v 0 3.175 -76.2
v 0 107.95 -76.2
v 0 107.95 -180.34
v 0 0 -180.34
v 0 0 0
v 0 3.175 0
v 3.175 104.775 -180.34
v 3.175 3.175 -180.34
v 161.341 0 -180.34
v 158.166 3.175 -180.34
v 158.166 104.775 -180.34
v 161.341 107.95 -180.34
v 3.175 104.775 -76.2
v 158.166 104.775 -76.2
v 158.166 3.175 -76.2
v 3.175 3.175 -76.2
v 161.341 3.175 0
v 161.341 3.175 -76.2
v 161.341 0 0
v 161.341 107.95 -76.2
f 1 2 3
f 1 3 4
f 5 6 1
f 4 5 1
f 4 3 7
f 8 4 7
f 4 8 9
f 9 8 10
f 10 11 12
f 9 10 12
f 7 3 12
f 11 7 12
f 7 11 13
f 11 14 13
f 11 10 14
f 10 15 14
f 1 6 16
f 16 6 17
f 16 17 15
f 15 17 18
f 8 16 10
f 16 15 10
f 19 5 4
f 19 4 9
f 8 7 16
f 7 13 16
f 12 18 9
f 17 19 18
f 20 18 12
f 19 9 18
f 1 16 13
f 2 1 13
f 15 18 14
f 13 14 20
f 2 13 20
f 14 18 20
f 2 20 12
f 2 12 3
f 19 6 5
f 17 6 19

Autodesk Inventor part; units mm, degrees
ref_plane "YZ Plane" through (0, 0, 0) normal (1, 0, 0) x (0, 1, 0)
ref_plane "XZ Plane" through (0, 0, 0) normal (0, 1, 0) x (-1, 0, 0)
ref_plane "XY Plane" through (0, 0, 0) normal (0, 0, 1) x (1, 0, 0)
sketch "Sketch1" plane through (0, 0, 0) normal (0, 0, 1) x (1, 0, 0)
  line L0 (0, 0) -> (161.3408, 0)
  line L1 (161.3408, 0) -> (161.3408, 107.95)
  line L2 (161.3408, 107.95) -> (0, 107.95)
  line L3 (0, 107.95) -> (0, 0)
  line L4 (3.175, 3.175) -> (158.1658, 3.175)
  line L5 (158.1658, 3.175) -> (158.1658, 104.775)
  line L6 (158.1658, 104.775) -> (3.175, 104.775)
  line L7 (3.175, 104.775) -> (3.175, 3.175)
  dimension "d0" = 161.3408
  dimension "d1" = 107.95
  dimension "d2" = 154.9908
  dimension "d3" = 101.6
  dimension "d4" = 3.175
  dimension "d5" = 3.175
extrude "Extrusion1" add sketch "Sketch1" against normal blind 180.34
sketch "Sketch2" plane through (161.3408, 0, 0) normal (1, 0, 0) x (0, 0, -1)
  line L0 (0, 3.175) -> (180.34, 3.175) projected
  line L1 (0, 107.95) -> (180.34, 107.95) projected
  line L2 (0, 3.175) -> (76.2, 3.175)
  line L3 (76.2, 3.175) -> (76.2, 107.95)
  line L4 (76.2, 107.95) -> (0, 107.95)
  line L5 (0, 107.95) -> (0, 3.175)
  point P0 (0, 0)
  dimension "d8" = 76.2
extrude "Extrusion2" cut sketch "Sketch2" against normal through all
properties part number "Bucket" material "Polycarbonate, Clear"
